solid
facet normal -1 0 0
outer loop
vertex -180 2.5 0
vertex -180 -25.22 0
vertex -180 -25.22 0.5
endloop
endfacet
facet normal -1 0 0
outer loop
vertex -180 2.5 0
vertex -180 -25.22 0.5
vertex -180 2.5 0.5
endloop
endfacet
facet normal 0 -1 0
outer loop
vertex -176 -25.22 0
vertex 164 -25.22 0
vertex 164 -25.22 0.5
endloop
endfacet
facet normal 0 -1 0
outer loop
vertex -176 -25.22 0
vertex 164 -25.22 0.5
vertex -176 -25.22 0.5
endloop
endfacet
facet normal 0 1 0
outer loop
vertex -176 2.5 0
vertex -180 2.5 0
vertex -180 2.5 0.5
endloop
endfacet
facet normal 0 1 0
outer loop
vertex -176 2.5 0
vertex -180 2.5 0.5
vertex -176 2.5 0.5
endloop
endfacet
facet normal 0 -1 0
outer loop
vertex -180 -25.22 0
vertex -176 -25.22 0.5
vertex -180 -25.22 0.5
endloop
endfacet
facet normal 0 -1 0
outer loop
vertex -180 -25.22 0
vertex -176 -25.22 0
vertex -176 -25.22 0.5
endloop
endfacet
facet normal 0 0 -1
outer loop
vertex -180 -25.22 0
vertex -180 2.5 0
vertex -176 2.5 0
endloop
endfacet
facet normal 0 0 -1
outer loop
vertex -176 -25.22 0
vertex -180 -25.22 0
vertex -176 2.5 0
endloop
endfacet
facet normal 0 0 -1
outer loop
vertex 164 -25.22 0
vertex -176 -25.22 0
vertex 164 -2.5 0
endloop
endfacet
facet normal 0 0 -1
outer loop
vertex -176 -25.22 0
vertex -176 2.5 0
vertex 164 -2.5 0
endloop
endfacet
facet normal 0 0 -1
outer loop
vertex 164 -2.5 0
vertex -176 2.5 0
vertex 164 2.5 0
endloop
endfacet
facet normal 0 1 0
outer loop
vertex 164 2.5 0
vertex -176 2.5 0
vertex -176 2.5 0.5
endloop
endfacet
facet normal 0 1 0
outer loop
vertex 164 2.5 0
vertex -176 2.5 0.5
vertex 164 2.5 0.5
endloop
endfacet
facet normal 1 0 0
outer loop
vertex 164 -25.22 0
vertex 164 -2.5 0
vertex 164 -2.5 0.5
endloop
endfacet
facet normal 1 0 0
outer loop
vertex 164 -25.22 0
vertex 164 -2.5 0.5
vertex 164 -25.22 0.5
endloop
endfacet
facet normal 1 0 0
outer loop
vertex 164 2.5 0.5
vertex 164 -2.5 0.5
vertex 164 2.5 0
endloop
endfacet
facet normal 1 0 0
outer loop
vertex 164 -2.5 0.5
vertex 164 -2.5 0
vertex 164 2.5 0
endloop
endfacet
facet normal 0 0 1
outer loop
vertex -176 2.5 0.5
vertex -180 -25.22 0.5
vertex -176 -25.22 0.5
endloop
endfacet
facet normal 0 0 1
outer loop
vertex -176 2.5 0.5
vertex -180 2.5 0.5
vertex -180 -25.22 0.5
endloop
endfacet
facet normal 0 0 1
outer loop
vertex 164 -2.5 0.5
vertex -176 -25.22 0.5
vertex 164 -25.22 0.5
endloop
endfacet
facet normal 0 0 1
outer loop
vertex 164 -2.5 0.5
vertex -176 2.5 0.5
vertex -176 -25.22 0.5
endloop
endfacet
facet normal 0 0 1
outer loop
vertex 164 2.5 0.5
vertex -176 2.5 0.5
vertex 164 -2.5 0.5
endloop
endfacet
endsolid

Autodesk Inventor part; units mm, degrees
ref_plane "YZ Plane" through (0, 0, 0) normal (1, 0, 0) x (0, 1, 0)
ref_plane "XZ Plane" through (0, 0, 0) normal (0, 1, 0) x (-1, 0, 0)
ref_plane "XY Plane" through (0, 0, 0) normal (0, 0, 1) x (1, 0, 0)
sketch "スケッチ1" plane through (0, 0, 0) normal (0, 0, 1) x (1, 0, 0)
  line L0 (-176, 2.5) -> (164, 2.5) projected
  line L1 (164, -25.22) -> (-176, -25.22) projected
  line L2 (-180, -105) -> (-180, 5) projected
  line L3 (164, -2.5) -> (164, 2.5) projected
  line L4 (-180, 2.5) -> (164, 2.5)
  line L5 (164, 2.5) -> (164, -25.22)
  line L6 (164, -25.22) -> (-180, -25.22)
  line L7 (-180, -25.22) -> (-180, 2.5)
  point P0 (0, 0)
  point P1 (-180, -25.22)
extrude "押し出し1" add sketch "スケッチ1" along normal blind 0.5
properties part number "板2" material "アルミニウム 6061"
